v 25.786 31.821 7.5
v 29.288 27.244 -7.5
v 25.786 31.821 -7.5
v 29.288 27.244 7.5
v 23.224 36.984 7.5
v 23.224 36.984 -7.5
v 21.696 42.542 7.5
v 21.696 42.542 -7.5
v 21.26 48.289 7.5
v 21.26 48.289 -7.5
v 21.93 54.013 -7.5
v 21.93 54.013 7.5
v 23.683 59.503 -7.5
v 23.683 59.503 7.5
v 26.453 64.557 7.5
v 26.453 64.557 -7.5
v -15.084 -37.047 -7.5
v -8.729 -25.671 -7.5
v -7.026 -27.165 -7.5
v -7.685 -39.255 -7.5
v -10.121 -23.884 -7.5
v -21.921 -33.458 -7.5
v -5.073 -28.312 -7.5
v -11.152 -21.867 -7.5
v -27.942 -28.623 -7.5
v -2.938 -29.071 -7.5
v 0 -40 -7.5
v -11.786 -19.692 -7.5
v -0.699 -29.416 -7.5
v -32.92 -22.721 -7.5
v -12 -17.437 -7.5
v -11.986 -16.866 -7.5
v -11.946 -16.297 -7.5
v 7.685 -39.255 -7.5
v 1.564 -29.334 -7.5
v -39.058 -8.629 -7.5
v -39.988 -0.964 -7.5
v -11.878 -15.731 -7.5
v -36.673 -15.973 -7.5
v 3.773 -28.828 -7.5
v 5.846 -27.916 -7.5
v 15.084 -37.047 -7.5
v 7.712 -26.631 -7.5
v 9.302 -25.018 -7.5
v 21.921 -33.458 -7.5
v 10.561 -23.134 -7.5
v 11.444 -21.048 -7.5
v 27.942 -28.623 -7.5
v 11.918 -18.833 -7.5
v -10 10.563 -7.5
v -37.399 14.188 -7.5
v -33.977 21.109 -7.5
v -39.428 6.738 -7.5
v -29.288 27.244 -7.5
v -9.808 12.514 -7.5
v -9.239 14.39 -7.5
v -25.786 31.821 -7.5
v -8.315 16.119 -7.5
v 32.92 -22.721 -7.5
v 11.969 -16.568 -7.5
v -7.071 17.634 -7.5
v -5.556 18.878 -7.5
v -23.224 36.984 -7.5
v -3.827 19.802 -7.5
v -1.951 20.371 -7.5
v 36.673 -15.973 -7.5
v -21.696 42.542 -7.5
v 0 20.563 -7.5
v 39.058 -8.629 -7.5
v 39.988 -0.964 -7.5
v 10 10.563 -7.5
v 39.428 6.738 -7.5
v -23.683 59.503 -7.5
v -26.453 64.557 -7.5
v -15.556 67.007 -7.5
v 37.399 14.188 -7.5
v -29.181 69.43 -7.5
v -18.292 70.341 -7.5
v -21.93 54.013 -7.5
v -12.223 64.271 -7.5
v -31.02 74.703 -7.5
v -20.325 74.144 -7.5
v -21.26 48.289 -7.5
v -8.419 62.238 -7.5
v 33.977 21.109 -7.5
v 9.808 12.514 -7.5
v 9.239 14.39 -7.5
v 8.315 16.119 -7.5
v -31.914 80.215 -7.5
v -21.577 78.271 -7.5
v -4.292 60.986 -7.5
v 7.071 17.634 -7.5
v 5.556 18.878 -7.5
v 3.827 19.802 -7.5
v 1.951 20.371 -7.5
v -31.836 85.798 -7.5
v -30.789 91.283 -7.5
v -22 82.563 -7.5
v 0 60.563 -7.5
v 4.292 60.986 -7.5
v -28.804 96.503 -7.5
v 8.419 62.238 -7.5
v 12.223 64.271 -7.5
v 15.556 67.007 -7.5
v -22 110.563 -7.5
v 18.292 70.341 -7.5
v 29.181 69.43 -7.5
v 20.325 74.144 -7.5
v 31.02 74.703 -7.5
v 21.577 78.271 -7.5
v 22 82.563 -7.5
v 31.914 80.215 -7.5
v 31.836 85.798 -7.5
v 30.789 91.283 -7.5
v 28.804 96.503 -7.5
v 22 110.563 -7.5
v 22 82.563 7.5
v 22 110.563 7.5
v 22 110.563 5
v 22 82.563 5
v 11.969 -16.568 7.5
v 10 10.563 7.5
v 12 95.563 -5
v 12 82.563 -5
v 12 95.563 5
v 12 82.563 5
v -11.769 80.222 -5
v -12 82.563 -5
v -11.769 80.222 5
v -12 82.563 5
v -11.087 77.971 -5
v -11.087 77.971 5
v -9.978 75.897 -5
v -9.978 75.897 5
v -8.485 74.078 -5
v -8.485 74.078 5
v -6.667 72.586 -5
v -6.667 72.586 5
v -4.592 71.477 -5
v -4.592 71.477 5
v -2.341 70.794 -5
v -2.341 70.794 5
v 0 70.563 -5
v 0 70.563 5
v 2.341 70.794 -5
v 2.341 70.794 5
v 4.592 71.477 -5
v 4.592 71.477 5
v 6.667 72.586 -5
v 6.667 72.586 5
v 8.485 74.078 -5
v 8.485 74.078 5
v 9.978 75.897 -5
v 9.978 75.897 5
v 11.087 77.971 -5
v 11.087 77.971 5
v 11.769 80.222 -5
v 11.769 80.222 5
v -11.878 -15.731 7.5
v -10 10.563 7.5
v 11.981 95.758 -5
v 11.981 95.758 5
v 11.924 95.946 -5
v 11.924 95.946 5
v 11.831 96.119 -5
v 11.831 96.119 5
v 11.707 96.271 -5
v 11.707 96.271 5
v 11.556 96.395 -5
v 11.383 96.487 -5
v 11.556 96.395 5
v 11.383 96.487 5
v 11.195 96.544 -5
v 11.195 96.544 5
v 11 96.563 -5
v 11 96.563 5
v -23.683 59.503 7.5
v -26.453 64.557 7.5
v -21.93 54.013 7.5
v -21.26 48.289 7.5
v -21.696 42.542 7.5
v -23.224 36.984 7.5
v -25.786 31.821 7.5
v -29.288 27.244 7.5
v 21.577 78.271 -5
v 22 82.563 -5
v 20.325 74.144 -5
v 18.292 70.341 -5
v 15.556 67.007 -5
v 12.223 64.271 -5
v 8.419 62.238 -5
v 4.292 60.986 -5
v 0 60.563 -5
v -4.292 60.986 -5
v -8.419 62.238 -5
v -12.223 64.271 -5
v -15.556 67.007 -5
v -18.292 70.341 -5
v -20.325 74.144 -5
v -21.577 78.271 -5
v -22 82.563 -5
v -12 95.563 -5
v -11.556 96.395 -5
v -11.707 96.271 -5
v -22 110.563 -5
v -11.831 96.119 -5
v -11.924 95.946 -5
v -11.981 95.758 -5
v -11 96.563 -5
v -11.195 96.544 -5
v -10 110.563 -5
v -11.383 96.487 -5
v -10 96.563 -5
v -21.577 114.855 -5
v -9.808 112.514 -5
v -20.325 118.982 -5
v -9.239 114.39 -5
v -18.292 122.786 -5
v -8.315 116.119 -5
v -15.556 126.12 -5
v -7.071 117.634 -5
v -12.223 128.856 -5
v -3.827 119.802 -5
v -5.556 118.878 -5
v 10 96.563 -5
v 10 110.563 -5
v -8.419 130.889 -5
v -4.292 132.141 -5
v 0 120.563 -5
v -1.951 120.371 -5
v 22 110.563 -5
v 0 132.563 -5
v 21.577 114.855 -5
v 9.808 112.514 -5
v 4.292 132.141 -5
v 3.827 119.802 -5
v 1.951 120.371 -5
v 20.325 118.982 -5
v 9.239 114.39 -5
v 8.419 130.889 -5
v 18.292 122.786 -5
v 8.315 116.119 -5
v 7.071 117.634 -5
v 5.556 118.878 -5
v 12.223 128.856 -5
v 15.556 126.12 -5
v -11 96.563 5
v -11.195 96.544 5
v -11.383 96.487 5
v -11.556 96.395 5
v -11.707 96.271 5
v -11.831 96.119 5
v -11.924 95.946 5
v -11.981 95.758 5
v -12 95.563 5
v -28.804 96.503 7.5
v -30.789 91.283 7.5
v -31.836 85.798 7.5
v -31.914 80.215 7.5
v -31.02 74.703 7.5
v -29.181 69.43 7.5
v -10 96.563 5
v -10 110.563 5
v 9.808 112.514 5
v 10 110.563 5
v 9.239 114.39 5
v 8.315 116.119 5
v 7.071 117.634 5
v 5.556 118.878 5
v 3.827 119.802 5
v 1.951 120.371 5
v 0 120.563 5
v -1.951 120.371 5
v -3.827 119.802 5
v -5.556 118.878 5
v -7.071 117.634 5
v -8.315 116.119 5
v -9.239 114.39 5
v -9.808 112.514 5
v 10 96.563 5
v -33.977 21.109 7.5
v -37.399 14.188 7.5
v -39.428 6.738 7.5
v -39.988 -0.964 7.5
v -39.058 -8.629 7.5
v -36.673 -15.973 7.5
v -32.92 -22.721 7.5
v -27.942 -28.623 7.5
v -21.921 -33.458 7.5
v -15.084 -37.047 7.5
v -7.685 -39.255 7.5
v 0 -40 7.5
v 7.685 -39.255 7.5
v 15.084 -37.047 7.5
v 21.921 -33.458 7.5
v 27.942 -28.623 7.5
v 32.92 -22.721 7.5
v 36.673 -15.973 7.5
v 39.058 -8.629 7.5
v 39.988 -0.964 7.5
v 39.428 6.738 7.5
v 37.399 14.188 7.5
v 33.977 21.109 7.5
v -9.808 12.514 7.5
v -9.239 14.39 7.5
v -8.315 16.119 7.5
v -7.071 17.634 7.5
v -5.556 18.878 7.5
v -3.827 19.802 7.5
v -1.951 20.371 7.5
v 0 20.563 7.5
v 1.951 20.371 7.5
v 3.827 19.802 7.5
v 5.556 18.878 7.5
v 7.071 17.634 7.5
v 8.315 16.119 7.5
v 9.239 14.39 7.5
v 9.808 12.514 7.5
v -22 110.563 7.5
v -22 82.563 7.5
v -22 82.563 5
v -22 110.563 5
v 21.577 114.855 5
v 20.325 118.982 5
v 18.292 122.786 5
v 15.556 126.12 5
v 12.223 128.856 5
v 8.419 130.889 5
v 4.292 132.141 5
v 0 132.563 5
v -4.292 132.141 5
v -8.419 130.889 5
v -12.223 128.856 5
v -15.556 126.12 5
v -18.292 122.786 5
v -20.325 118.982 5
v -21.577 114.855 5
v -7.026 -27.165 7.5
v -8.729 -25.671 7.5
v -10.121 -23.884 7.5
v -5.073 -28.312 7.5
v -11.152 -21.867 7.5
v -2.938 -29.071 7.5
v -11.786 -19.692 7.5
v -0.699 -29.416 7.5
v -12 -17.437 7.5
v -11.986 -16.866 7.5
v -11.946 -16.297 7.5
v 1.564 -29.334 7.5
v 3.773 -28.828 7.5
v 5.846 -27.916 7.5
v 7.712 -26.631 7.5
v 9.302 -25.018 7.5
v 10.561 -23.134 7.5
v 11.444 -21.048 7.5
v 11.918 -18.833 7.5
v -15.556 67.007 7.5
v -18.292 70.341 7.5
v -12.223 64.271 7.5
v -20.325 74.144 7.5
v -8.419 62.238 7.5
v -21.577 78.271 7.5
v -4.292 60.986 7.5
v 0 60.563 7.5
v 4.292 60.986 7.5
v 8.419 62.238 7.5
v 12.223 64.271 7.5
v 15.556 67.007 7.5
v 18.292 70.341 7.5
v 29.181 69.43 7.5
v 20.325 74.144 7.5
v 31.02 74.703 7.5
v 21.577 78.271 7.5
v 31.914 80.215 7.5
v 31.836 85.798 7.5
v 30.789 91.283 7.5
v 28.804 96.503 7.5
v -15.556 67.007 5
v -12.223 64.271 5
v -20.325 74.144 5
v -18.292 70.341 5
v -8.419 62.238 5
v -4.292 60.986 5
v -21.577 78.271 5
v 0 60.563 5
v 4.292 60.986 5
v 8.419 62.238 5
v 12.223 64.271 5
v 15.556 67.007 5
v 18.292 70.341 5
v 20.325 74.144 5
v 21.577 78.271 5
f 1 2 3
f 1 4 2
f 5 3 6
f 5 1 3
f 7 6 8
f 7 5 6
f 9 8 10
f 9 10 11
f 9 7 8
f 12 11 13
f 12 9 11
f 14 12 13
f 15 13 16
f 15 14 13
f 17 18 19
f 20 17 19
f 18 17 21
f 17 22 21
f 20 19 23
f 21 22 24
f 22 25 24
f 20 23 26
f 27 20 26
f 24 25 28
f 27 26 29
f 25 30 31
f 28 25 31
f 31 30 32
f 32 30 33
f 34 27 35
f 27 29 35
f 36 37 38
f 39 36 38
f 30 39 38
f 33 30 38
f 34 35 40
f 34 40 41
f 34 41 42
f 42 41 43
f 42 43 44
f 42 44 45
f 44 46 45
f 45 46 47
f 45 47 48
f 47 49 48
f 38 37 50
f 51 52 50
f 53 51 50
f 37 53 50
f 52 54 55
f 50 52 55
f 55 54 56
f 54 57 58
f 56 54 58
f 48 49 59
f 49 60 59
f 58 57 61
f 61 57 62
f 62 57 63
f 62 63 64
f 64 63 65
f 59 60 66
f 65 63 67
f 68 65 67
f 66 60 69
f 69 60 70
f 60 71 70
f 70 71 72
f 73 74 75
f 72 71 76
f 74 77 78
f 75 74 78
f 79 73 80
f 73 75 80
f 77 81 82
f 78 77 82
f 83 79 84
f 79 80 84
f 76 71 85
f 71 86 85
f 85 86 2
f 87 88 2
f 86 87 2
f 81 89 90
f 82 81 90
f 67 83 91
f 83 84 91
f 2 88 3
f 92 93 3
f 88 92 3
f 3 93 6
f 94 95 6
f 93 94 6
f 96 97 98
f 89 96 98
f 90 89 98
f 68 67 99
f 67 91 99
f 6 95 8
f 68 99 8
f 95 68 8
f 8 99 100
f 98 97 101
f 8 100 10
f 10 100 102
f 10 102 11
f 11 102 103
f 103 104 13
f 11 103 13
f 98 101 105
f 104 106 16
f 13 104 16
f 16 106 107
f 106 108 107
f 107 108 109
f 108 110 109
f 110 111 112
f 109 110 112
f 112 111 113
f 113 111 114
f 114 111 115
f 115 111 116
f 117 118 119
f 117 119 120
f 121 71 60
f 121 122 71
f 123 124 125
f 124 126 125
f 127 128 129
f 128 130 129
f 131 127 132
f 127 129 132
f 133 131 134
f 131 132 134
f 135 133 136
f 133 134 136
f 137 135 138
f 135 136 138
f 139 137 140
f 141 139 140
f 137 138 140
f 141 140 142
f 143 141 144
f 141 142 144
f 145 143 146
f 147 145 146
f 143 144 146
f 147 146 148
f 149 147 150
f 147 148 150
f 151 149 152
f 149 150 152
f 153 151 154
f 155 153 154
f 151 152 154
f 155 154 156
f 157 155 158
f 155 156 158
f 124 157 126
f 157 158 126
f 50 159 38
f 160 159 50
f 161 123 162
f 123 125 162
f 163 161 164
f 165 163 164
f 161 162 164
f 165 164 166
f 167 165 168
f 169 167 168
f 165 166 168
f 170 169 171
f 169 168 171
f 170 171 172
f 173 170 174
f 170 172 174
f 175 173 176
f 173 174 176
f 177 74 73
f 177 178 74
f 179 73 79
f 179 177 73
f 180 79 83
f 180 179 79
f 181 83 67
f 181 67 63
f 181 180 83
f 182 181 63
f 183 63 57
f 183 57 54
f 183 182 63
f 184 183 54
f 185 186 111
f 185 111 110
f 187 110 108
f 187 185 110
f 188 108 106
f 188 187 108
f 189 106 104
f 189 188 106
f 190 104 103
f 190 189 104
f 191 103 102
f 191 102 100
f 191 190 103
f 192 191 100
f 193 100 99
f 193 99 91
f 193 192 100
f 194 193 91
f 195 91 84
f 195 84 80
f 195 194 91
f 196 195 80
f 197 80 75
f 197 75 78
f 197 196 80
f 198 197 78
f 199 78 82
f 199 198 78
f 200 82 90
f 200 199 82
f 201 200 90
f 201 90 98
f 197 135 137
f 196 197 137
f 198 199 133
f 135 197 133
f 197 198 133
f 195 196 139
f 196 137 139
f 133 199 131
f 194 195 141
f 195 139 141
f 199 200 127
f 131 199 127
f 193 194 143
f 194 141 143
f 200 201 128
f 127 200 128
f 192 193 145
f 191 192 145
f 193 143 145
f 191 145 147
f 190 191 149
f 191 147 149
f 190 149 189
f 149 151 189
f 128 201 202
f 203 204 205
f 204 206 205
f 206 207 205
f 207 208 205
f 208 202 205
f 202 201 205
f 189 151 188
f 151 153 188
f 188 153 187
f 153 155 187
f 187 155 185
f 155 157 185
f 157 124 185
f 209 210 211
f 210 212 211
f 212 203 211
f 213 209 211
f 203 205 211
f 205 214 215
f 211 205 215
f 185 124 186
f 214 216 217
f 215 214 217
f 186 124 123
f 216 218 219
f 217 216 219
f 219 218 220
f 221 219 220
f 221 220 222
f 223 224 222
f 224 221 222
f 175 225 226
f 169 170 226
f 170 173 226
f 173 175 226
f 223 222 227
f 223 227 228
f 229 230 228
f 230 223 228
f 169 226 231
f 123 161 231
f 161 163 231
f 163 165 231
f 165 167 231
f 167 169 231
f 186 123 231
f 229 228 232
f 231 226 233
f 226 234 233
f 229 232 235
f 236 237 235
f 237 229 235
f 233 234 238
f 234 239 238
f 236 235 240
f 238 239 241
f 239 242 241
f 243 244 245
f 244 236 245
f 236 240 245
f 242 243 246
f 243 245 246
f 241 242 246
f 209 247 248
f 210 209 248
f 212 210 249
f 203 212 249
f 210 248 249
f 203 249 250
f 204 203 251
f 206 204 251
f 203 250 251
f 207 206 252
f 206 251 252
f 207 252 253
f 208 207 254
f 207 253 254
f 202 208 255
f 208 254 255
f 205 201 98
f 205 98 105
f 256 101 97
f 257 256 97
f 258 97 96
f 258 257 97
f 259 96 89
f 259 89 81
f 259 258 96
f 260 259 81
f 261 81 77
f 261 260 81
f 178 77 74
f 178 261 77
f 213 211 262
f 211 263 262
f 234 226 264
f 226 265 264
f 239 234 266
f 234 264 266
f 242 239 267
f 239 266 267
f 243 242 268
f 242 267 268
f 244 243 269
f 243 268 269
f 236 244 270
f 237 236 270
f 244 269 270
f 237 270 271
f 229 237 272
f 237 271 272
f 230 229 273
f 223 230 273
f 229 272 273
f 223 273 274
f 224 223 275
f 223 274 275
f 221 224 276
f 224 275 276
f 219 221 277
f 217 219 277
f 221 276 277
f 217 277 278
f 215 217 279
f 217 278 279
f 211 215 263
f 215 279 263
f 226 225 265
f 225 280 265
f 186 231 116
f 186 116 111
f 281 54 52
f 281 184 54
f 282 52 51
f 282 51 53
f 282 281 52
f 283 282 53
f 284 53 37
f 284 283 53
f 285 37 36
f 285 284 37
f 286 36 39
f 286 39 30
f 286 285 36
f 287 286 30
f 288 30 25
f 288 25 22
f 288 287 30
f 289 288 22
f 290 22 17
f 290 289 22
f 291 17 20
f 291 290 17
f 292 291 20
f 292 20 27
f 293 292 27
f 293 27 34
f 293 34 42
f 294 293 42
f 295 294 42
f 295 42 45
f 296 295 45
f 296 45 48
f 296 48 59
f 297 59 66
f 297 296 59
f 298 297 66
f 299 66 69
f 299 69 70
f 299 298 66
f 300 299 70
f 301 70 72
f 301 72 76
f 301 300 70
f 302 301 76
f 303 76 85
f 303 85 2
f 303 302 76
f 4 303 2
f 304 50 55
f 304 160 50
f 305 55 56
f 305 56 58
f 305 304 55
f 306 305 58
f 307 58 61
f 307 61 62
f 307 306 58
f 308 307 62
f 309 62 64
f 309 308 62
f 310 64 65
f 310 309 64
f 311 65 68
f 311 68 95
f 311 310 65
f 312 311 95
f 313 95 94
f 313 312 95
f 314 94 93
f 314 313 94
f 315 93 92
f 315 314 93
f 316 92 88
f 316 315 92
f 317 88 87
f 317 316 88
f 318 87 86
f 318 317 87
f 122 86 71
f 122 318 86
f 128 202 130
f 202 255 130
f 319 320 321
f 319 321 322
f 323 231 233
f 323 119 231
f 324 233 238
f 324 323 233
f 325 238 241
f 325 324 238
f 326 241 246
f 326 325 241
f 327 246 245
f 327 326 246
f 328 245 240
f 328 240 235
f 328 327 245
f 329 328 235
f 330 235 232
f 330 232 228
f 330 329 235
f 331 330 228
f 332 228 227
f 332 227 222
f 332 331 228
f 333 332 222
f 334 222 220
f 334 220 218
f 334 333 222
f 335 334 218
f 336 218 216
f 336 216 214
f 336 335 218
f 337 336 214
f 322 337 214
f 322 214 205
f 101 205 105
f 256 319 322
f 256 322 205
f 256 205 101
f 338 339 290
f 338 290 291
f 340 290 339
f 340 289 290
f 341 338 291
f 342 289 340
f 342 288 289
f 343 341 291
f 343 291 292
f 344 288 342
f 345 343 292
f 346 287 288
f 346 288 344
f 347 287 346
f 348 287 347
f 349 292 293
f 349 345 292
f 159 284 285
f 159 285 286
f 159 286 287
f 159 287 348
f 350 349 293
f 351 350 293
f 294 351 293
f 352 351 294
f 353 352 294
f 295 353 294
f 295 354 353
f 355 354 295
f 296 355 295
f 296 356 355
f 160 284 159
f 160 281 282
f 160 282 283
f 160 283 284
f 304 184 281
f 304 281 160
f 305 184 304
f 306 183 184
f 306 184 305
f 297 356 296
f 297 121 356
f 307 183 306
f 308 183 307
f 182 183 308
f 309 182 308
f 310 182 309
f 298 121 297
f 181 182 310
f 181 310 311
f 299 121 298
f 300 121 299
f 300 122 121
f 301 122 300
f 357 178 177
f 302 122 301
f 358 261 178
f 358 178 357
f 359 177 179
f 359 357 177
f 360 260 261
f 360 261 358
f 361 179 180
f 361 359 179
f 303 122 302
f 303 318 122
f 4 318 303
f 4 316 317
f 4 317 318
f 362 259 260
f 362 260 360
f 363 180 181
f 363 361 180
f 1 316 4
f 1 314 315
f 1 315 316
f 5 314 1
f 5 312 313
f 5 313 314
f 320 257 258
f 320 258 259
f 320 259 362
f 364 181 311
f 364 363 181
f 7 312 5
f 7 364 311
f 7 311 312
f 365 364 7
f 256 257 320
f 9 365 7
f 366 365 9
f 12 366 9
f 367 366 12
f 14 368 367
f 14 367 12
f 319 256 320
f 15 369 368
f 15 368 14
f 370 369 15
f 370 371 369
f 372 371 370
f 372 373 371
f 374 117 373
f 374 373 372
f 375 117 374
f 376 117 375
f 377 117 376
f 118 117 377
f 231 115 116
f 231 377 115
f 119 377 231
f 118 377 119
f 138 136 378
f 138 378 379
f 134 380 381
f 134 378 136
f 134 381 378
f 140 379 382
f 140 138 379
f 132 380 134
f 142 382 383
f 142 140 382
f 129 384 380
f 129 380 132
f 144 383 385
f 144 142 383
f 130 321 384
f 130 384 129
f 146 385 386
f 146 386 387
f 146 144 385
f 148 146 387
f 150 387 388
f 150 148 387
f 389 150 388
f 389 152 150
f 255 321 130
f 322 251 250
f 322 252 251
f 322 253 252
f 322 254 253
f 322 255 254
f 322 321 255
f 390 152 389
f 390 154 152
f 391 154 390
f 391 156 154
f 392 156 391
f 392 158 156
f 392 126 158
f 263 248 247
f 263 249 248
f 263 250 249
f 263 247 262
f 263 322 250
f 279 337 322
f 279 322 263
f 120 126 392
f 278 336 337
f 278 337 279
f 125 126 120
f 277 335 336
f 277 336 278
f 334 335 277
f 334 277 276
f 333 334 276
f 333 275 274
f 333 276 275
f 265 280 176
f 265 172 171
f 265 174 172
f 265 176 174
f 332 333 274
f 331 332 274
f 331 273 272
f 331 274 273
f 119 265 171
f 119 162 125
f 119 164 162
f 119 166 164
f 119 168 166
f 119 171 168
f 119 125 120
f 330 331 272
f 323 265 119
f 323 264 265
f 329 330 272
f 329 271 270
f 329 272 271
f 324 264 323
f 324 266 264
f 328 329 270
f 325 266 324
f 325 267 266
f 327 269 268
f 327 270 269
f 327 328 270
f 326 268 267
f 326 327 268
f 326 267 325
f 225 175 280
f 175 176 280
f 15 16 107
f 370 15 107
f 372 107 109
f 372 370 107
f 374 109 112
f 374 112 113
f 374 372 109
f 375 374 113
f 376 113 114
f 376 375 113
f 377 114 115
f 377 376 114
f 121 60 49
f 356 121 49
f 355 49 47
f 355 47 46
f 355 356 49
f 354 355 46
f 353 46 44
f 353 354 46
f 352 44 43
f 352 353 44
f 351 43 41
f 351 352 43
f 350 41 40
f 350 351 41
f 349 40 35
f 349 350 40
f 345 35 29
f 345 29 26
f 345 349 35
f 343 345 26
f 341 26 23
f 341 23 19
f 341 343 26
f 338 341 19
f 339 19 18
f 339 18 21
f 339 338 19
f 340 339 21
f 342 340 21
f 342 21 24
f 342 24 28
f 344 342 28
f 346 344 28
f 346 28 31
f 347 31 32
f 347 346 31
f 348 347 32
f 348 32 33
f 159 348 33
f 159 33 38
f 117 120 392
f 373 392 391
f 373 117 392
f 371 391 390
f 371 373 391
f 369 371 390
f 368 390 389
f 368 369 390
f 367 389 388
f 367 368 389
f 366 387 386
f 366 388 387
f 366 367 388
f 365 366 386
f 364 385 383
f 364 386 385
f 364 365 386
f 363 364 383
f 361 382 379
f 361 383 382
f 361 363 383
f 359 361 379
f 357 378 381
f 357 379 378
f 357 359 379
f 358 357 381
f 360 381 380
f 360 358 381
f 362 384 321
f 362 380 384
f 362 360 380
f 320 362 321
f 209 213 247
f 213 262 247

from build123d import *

# Parameters (mm, degrees)
BOSS_EXTRUDE3_DEPTH = 5
BOSS_EXTRUDE4_DEPTH = 7.5


with BuildPart() as part:
    # Sketch1 → Boss-Extrude3 (new, symmetric)
    with BuildSketch(Plane.XY):
        with BuildLine():
            Line((22, 82.563407366), (22, 110.563407366))
            ThreePointArc((22, 110.563407366), (0, 132.563407366), (-22, 110.563407366))
            Line((-22, 110.563407366), (-22, 82.563407366))
            ThreePointArc((-22, 82.563407366), (0, 60.563407366), (22, 82.563407366))
        make_face()
        with BuildLine():
            ThreePointArc((-10, 110.563407366), (0, 120.563407366), (10, 110.563407366))
            Line((10, 110.563407366), (10, 96.563407366))
            Line((10, 96.563407366), (11, 96.563407366))
            ThreePointArc((11, 96.563407366), (11.707106781, 96.270514148), (12, 95.563407366))
            Line((12, 95.563407366), (12, 82.563407366))
            ThreePointArc((12, 82.563407366), (0, 70.563407366), (-12, 82.563407366))
            Line((-12, 82.563407366), (-12, 95.563407366))
            ThreePointArc((-12, 95.563407366), (-11.707106781, 96.270514148), (-11, 96.563407366))
            Line((-11, 96.563407366), (-10, 96.563407366))
            Line((-10, 96.563407366), (-10, 110.563407366))
        make_face(mode=Mode.SUBTRACT)
    extrude(amount=BOSS_EXTRUDE3_DEPTH, both=True)

    # Sketch1<5> → Boss-Extrude4 (add, symmetric)
    with BuildSketch(Plane.XY):
        with BuildLine():
            Line((28.804390709, 96.502814665), (22, 110.563407366))
            Line((22, 110.563407366), (22, 82.563407366))
            ThreePointArc((22, 82.563407366), (0, 60.563407366), (-22, 82.563407366))
            Line((-22, 82.563407366), (-22, 110.563407366))
            Line((-22, 110.563407366), (-28.804390709, 96.502814665))
            ThreePointArc((-28.804390709, 96.502814665), (-31.91369551, 80.214782471), (-26.453432284, 64.557410577))
            ThreePointArc((-26.453432284, 64.557410577), (-21.339698738, 45.404566029), (-29.2877286, 27.243879192))
            ThreePointArc((-29.2877286, 27.243879192), (0, -40), (29.2877286, 27.243879192))
            ThreePointArc((29.2877286, 27.243879192), (21.339698738, 45.404566029), (26.453432284, 64.557410577))
            ThreePointArc((26.453432284, 64.557410577), (31.91369551, 80.214782471), (28.804390709, 96.502814665))
        make_face()
        with BuildLine():
            Line((-11.878172589, -15.731008877), (-10, 10.563407366))
            ThreePointArc((-10, 10.563407366), (0, 20.563407366), (10, 10.563407366))
            Line((10, 10.563407366), (11.968538667, -16.568213586))
            ThreePointArc((11.968538667, -16.568213586), (0.434474391, -29.428724721), (-12, -17.436592634))
            ThreePointArc((-12, -17.436592634), (-11.969504398, -16.581628034), (-11.878172589, -15.731008877))
        make_face(mode=Mode.SUBTRACT)
    extrude(amount=BOSS_EXTRUDE4_DEPTH, both=True)


solid = part.part
